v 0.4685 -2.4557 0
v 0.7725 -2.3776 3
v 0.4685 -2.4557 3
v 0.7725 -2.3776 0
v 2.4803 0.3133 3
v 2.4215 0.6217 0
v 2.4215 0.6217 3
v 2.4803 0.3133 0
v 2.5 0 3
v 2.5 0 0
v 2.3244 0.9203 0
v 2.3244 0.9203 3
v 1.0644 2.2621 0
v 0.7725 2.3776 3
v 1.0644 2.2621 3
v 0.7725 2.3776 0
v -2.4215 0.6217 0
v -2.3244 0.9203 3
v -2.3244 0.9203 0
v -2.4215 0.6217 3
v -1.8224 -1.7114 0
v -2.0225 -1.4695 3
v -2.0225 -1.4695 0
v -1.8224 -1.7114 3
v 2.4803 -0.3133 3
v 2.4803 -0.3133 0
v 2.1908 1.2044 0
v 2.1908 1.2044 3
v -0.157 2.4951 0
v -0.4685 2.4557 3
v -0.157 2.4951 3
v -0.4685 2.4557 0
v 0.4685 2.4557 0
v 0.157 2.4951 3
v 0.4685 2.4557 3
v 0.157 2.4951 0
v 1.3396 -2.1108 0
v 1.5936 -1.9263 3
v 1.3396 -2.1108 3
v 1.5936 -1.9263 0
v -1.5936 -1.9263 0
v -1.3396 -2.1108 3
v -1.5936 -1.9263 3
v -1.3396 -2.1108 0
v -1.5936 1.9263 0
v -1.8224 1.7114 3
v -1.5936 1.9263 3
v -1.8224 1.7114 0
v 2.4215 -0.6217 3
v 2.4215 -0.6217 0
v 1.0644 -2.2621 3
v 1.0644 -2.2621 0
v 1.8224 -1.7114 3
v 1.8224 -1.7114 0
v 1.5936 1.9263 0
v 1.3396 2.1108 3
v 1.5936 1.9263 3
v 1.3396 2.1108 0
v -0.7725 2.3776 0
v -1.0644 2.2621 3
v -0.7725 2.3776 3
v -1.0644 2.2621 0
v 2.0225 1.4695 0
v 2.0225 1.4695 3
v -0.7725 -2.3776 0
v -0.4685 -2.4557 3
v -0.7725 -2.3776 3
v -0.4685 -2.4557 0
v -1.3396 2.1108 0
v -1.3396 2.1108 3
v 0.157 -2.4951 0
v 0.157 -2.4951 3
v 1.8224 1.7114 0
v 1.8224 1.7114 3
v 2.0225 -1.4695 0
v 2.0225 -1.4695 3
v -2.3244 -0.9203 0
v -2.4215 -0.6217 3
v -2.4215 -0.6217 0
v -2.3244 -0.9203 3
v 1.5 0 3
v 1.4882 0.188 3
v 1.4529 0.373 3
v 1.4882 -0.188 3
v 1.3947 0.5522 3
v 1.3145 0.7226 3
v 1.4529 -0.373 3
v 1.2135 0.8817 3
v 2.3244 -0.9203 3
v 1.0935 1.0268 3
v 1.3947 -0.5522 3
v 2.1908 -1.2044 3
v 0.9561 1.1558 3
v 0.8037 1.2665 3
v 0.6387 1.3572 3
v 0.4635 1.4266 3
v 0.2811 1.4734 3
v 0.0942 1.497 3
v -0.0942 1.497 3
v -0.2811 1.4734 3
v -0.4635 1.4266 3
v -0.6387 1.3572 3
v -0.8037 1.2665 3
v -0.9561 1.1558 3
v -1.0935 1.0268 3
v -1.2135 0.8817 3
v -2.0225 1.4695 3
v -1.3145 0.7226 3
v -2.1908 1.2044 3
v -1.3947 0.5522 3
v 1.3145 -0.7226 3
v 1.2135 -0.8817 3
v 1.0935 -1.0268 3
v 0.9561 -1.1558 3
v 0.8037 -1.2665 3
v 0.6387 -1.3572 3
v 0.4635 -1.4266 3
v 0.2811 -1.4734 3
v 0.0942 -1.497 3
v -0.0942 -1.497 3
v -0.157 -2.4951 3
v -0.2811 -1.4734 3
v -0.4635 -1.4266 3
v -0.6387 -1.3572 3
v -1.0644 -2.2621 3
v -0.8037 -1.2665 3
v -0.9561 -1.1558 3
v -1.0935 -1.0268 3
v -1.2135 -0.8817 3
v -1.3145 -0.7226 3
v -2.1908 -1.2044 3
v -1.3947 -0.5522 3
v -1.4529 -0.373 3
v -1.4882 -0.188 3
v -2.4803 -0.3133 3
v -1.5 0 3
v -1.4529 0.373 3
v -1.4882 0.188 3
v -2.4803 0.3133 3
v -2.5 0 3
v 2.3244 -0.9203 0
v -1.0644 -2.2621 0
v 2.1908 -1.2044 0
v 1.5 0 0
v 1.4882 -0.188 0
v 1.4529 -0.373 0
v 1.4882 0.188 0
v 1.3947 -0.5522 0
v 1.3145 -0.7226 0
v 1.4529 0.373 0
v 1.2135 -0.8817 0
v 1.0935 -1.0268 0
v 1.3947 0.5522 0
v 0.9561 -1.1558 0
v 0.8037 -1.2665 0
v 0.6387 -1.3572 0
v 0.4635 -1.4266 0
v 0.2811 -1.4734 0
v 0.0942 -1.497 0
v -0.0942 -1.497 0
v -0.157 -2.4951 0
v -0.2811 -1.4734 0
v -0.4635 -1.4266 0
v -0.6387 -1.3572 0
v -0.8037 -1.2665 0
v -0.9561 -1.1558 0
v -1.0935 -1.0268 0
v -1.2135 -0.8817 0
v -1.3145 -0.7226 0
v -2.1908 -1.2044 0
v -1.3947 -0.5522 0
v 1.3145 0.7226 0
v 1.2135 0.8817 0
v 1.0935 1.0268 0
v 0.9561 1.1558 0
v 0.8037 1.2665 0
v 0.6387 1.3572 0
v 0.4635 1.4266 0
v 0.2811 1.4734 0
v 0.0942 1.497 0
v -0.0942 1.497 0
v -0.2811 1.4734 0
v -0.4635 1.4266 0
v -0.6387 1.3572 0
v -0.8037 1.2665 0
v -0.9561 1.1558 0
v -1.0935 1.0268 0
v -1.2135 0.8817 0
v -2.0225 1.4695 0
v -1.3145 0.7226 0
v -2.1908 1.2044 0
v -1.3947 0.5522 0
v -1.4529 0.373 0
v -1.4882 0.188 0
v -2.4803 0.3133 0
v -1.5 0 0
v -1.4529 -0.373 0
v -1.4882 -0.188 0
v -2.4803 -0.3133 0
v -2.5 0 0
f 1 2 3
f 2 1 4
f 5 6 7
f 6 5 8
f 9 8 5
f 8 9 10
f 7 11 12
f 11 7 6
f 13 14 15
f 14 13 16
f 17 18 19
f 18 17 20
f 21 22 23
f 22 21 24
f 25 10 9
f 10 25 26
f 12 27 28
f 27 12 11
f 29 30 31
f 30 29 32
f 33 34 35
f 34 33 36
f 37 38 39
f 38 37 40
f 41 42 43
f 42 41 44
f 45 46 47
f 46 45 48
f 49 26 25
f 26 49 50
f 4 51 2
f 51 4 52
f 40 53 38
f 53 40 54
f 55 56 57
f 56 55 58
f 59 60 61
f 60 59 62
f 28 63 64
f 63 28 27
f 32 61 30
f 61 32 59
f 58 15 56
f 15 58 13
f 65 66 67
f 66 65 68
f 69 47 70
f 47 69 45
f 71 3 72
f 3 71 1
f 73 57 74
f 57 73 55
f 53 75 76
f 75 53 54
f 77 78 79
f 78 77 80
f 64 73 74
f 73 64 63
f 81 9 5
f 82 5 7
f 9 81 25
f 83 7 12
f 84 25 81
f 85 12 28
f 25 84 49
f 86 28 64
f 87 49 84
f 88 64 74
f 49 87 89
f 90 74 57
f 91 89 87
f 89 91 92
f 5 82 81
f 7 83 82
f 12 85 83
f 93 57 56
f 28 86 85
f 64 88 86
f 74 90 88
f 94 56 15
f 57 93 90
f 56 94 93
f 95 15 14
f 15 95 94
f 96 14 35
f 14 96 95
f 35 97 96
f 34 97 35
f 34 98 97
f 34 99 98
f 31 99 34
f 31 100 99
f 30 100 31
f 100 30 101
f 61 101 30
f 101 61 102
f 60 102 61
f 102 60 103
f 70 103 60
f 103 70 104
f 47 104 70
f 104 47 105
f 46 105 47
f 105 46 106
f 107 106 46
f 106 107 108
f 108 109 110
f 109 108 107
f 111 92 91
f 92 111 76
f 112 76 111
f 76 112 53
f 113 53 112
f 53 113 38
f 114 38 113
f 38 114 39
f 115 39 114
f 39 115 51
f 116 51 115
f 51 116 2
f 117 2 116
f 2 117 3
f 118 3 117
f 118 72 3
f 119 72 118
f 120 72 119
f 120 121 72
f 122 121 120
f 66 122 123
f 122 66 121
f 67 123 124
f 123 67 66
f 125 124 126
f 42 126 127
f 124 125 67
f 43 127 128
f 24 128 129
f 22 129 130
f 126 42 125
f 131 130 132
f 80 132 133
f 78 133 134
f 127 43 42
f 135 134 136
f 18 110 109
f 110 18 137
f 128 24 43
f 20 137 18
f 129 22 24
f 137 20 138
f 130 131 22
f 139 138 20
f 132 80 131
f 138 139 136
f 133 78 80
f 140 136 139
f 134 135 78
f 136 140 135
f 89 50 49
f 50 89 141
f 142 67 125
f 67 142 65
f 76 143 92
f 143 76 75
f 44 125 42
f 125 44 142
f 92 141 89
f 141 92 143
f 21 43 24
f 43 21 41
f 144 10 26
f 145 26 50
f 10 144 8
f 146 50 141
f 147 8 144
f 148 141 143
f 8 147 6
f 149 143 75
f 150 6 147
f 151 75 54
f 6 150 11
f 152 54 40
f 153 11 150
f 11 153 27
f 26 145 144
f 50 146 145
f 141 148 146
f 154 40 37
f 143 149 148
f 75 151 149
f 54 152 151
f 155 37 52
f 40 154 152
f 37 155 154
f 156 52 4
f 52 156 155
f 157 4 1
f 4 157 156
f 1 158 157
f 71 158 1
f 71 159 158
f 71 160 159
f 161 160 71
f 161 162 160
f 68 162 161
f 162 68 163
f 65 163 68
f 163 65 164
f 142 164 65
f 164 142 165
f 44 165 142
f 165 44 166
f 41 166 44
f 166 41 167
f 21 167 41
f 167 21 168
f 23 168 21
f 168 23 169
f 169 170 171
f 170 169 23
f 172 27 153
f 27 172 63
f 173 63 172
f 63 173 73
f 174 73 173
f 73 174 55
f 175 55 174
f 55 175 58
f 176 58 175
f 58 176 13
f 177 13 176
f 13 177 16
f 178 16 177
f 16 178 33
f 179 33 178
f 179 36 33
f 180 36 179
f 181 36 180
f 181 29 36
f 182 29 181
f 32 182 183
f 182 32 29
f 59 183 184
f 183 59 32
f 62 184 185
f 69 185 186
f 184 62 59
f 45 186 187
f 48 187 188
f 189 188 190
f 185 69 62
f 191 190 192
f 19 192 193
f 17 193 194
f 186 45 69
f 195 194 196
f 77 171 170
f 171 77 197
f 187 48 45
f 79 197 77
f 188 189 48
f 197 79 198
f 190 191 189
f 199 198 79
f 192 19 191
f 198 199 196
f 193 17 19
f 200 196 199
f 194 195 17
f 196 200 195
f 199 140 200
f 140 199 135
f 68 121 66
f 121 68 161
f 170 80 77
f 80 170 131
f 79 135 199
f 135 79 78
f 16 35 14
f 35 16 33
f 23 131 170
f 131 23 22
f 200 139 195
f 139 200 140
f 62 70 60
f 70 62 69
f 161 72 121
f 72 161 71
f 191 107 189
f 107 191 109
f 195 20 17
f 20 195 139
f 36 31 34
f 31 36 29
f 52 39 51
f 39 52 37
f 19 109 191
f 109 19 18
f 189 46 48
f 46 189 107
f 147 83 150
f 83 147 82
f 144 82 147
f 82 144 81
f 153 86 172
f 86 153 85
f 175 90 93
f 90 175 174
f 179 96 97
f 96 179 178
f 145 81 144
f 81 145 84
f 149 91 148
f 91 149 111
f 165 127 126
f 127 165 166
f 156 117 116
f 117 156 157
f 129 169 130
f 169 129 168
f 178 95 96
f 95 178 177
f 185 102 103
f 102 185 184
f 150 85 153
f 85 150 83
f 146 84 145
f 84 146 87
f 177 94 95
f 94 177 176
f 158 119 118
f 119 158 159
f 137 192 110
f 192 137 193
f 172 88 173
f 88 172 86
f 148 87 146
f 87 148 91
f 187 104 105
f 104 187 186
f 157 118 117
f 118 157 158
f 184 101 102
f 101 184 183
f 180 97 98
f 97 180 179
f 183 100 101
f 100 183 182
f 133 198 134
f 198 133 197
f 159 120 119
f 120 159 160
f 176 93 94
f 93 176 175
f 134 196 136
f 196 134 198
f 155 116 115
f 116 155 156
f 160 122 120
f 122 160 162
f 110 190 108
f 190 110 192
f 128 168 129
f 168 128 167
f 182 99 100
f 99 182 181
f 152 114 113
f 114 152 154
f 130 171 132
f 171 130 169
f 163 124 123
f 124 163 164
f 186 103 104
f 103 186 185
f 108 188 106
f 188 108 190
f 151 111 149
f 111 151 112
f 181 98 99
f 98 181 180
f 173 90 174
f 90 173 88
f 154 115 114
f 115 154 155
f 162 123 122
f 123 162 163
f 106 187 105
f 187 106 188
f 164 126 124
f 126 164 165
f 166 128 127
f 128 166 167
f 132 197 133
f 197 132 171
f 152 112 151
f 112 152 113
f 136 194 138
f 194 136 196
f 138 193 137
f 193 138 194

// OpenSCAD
inner_diameter = 3;
outer_diameter = 5;
washer_height = 3;
e=.01;
ee=.005;

$fn = 50;

difference() {
	cylinder(washer_height, d=outer_diameter);
	translate([0,0,-ee]) {
		cylinder(washer_height+e, d=inner_diameter);
	}
}
